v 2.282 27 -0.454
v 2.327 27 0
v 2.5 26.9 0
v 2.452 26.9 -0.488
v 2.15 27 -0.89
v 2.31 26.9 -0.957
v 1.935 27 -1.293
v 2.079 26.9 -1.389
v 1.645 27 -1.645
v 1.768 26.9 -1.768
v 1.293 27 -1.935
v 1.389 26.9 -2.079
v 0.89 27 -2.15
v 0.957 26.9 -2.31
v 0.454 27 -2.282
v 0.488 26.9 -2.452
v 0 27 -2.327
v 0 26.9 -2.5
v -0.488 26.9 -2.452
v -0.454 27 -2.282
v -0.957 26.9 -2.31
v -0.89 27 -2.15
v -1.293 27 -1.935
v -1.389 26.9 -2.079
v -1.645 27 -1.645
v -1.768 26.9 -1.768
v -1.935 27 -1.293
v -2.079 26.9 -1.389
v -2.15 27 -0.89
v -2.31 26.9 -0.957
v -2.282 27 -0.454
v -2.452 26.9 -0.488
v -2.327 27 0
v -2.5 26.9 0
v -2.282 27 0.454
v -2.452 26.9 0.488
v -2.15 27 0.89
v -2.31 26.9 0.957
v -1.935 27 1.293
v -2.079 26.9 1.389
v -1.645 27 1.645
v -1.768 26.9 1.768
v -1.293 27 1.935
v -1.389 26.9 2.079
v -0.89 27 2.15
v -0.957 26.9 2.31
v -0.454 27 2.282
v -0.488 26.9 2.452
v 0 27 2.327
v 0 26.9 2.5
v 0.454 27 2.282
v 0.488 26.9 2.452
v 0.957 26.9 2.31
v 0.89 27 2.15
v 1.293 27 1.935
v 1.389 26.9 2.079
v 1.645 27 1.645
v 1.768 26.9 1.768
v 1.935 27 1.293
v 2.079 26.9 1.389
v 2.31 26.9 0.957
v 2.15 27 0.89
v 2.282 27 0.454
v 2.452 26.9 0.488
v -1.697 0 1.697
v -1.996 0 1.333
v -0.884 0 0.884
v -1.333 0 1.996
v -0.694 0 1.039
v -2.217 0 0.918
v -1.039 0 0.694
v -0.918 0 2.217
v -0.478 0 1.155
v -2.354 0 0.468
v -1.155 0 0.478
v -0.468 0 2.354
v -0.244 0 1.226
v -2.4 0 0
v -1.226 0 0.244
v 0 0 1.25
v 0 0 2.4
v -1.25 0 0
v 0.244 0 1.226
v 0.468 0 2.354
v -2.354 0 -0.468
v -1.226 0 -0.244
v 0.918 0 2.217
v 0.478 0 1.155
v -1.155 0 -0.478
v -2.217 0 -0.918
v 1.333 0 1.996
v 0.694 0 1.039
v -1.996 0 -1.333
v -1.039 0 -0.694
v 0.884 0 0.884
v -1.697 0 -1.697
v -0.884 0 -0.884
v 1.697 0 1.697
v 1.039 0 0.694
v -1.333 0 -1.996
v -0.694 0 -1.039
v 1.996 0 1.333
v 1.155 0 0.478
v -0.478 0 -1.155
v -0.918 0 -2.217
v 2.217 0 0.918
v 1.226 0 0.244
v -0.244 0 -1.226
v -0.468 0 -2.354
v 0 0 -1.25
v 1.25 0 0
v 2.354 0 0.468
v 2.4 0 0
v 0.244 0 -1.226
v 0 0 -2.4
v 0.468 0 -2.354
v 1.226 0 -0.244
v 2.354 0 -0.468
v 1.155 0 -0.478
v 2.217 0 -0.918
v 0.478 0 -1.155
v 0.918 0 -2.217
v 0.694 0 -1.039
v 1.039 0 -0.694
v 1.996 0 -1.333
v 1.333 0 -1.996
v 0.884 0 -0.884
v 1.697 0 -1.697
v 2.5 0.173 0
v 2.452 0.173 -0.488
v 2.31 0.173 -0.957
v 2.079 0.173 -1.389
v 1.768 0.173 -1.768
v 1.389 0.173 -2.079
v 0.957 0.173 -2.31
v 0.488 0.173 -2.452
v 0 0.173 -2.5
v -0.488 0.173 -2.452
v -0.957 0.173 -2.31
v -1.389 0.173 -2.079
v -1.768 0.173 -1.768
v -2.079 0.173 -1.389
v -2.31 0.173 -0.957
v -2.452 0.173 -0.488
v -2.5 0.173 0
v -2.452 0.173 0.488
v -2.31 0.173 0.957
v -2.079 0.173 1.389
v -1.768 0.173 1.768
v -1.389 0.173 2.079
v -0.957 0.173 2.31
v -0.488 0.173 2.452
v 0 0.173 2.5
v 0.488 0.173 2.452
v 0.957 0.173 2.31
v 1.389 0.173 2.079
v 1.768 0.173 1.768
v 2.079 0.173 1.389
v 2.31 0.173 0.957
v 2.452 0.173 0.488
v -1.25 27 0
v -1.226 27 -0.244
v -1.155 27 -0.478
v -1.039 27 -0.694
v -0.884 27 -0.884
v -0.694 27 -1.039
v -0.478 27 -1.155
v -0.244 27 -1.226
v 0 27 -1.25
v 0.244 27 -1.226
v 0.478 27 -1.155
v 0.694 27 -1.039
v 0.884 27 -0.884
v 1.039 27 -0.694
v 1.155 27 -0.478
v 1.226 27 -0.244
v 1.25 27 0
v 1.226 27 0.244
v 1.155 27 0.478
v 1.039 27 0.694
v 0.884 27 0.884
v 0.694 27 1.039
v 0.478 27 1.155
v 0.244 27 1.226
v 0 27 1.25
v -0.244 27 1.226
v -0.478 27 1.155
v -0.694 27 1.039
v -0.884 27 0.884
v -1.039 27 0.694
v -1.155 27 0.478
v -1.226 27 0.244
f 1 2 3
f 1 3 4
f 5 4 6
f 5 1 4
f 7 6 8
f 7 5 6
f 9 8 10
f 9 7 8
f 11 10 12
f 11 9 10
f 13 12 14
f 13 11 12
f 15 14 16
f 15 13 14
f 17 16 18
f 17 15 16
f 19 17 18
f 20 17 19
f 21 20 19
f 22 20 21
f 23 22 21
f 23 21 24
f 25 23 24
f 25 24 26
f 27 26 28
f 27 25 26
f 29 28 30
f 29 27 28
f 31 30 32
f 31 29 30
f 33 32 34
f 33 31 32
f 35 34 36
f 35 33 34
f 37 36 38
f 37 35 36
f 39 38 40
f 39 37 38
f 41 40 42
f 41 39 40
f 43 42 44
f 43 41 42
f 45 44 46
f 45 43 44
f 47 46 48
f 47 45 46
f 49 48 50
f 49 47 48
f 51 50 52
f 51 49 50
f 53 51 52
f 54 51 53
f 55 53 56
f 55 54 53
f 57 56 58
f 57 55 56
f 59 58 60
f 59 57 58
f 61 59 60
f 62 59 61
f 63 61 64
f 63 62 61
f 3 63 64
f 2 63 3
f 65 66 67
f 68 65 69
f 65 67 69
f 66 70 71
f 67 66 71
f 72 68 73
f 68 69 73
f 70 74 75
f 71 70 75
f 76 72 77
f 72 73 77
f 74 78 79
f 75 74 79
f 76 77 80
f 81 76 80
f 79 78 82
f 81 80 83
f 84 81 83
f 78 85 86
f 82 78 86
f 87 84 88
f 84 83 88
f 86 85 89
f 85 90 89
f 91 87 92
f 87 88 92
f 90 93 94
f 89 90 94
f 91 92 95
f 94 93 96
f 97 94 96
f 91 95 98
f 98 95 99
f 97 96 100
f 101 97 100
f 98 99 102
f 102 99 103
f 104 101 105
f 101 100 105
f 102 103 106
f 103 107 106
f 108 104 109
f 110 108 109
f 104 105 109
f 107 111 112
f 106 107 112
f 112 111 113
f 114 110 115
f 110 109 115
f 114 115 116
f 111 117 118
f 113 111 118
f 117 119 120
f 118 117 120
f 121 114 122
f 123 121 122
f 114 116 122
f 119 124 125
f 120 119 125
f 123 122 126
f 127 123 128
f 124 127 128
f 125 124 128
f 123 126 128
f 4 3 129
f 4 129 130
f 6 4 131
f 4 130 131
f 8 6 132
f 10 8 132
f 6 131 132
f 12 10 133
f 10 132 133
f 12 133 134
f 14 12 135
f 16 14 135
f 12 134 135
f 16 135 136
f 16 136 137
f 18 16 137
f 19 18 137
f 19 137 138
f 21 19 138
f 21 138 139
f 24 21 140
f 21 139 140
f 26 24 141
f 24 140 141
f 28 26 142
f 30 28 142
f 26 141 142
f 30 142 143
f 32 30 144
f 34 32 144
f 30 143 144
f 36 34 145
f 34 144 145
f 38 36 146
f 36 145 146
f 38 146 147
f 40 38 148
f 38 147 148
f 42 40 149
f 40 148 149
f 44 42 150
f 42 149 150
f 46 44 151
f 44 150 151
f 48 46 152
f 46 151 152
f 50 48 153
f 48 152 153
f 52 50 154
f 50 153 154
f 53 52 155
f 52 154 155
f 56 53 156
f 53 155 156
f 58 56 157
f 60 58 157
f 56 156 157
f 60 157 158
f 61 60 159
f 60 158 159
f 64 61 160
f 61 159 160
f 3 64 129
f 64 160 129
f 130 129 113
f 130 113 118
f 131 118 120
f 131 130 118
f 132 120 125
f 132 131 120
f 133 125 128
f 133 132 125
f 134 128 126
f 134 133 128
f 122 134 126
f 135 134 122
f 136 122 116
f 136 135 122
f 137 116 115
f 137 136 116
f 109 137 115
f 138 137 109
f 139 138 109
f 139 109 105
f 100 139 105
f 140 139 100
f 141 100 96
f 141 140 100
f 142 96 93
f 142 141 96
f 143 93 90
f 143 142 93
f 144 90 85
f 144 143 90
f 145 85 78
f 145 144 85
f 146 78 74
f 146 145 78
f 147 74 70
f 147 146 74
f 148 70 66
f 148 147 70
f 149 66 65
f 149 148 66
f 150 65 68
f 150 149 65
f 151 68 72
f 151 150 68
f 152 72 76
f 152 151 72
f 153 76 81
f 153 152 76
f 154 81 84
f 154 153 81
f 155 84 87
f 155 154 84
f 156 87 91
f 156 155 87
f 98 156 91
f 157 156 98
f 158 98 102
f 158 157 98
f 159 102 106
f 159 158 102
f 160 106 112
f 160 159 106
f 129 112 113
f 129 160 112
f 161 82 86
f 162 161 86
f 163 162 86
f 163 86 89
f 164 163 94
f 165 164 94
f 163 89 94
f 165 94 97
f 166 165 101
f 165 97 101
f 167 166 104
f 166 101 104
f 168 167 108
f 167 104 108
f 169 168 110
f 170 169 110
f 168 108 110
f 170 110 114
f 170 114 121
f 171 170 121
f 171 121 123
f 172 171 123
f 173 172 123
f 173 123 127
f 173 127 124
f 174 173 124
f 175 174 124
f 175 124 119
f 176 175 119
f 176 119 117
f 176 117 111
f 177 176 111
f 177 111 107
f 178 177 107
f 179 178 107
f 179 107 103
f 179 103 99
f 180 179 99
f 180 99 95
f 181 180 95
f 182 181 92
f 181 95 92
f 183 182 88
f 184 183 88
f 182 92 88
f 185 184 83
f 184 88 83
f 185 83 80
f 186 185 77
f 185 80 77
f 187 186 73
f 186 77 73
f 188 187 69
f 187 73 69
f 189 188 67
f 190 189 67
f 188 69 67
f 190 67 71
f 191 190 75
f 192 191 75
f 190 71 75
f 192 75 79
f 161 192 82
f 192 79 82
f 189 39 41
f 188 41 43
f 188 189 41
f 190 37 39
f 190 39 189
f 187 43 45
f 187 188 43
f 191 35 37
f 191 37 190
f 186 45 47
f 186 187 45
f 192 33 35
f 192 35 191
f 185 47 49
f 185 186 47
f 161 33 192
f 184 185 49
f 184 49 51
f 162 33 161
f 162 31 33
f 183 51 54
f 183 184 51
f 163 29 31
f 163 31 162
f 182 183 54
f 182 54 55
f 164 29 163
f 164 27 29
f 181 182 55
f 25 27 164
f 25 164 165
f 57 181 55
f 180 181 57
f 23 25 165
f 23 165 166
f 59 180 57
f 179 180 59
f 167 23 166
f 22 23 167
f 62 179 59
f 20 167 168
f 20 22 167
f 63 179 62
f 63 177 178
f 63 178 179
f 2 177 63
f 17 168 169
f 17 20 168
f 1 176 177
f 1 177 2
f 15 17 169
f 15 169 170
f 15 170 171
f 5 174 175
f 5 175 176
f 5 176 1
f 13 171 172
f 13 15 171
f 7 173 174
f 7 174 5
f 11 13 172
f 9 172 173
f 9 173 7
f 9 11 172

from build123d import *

# Parameters (mm, degrees)
SKETCH2_R             = 2.5
BOSS_EXTRUDE1_DEPTH   = 27
CHAMFER1_SIZE         = 0.1
CHAMFER1_SIZE2        = 0.173205081
CHAMFER1_PART_2_SIZE  = 0.1
CHAMFER1_PART_2_SIZE2 = 0.173205081
M3X0_5_TAPPED_HOLE1_D = 2.5


with BuildPart() as part:
    # Sketch2 → Boss-Extrude1 (new body)
    with BuildSketch(Plane(origin=(0, 0, 0), x_dir=(1, 0, 0), z_dir=(0, 1, 0))):
        Circle(SKETCH2_R)
    extrude(amount=BOSS_EXTRUDE1_DEPTH)

    # Chamfer1
    chamfer1_edges = [part.edges().sort_by_distance(p)[0] for p in [
        (-2.5, 0, 0),
    ]]
    chamfer1_side = [part.faces().sort_by_distance(p)[0] for p in [
        (0, 0, 0),
    ]]
    chamfer(chamfer1_edges, length=CHAMFER1_SIZE, length2=CHAMFER1_SIZE2, reference=chamfer1_side[0])

    # Chamfer1 part 2
    chamfer1_part_2_edges = [part.edges().sort_by_distance(p)[0] for p in [
        (-2.5, 27, 0),
    ]]
    chamfer1_part_2_side = [part.faces().sort_by_distance(p)[0] for p in [
        (-2.5, 13.5, 0),
    ]]
    chamfer(chamfer1_part_2_edges, length=CHAMFER1_PART_2_SIZE, length2=CHAMFER1_PART_2_SIZE2, reference=chamfer1_part_2_side[0])

    # M3x0.5 Tapped Hole1 (through all)
    with Locations(Plane(origin=(0, 27, 0), x_dir=(1, 0, 0), z_dir=(0, 1, 0))):
        with Locations((0, 0)):
            Hole(M3X0_5_TAPPED_HOLE1_D / 2)


solid = part.part
